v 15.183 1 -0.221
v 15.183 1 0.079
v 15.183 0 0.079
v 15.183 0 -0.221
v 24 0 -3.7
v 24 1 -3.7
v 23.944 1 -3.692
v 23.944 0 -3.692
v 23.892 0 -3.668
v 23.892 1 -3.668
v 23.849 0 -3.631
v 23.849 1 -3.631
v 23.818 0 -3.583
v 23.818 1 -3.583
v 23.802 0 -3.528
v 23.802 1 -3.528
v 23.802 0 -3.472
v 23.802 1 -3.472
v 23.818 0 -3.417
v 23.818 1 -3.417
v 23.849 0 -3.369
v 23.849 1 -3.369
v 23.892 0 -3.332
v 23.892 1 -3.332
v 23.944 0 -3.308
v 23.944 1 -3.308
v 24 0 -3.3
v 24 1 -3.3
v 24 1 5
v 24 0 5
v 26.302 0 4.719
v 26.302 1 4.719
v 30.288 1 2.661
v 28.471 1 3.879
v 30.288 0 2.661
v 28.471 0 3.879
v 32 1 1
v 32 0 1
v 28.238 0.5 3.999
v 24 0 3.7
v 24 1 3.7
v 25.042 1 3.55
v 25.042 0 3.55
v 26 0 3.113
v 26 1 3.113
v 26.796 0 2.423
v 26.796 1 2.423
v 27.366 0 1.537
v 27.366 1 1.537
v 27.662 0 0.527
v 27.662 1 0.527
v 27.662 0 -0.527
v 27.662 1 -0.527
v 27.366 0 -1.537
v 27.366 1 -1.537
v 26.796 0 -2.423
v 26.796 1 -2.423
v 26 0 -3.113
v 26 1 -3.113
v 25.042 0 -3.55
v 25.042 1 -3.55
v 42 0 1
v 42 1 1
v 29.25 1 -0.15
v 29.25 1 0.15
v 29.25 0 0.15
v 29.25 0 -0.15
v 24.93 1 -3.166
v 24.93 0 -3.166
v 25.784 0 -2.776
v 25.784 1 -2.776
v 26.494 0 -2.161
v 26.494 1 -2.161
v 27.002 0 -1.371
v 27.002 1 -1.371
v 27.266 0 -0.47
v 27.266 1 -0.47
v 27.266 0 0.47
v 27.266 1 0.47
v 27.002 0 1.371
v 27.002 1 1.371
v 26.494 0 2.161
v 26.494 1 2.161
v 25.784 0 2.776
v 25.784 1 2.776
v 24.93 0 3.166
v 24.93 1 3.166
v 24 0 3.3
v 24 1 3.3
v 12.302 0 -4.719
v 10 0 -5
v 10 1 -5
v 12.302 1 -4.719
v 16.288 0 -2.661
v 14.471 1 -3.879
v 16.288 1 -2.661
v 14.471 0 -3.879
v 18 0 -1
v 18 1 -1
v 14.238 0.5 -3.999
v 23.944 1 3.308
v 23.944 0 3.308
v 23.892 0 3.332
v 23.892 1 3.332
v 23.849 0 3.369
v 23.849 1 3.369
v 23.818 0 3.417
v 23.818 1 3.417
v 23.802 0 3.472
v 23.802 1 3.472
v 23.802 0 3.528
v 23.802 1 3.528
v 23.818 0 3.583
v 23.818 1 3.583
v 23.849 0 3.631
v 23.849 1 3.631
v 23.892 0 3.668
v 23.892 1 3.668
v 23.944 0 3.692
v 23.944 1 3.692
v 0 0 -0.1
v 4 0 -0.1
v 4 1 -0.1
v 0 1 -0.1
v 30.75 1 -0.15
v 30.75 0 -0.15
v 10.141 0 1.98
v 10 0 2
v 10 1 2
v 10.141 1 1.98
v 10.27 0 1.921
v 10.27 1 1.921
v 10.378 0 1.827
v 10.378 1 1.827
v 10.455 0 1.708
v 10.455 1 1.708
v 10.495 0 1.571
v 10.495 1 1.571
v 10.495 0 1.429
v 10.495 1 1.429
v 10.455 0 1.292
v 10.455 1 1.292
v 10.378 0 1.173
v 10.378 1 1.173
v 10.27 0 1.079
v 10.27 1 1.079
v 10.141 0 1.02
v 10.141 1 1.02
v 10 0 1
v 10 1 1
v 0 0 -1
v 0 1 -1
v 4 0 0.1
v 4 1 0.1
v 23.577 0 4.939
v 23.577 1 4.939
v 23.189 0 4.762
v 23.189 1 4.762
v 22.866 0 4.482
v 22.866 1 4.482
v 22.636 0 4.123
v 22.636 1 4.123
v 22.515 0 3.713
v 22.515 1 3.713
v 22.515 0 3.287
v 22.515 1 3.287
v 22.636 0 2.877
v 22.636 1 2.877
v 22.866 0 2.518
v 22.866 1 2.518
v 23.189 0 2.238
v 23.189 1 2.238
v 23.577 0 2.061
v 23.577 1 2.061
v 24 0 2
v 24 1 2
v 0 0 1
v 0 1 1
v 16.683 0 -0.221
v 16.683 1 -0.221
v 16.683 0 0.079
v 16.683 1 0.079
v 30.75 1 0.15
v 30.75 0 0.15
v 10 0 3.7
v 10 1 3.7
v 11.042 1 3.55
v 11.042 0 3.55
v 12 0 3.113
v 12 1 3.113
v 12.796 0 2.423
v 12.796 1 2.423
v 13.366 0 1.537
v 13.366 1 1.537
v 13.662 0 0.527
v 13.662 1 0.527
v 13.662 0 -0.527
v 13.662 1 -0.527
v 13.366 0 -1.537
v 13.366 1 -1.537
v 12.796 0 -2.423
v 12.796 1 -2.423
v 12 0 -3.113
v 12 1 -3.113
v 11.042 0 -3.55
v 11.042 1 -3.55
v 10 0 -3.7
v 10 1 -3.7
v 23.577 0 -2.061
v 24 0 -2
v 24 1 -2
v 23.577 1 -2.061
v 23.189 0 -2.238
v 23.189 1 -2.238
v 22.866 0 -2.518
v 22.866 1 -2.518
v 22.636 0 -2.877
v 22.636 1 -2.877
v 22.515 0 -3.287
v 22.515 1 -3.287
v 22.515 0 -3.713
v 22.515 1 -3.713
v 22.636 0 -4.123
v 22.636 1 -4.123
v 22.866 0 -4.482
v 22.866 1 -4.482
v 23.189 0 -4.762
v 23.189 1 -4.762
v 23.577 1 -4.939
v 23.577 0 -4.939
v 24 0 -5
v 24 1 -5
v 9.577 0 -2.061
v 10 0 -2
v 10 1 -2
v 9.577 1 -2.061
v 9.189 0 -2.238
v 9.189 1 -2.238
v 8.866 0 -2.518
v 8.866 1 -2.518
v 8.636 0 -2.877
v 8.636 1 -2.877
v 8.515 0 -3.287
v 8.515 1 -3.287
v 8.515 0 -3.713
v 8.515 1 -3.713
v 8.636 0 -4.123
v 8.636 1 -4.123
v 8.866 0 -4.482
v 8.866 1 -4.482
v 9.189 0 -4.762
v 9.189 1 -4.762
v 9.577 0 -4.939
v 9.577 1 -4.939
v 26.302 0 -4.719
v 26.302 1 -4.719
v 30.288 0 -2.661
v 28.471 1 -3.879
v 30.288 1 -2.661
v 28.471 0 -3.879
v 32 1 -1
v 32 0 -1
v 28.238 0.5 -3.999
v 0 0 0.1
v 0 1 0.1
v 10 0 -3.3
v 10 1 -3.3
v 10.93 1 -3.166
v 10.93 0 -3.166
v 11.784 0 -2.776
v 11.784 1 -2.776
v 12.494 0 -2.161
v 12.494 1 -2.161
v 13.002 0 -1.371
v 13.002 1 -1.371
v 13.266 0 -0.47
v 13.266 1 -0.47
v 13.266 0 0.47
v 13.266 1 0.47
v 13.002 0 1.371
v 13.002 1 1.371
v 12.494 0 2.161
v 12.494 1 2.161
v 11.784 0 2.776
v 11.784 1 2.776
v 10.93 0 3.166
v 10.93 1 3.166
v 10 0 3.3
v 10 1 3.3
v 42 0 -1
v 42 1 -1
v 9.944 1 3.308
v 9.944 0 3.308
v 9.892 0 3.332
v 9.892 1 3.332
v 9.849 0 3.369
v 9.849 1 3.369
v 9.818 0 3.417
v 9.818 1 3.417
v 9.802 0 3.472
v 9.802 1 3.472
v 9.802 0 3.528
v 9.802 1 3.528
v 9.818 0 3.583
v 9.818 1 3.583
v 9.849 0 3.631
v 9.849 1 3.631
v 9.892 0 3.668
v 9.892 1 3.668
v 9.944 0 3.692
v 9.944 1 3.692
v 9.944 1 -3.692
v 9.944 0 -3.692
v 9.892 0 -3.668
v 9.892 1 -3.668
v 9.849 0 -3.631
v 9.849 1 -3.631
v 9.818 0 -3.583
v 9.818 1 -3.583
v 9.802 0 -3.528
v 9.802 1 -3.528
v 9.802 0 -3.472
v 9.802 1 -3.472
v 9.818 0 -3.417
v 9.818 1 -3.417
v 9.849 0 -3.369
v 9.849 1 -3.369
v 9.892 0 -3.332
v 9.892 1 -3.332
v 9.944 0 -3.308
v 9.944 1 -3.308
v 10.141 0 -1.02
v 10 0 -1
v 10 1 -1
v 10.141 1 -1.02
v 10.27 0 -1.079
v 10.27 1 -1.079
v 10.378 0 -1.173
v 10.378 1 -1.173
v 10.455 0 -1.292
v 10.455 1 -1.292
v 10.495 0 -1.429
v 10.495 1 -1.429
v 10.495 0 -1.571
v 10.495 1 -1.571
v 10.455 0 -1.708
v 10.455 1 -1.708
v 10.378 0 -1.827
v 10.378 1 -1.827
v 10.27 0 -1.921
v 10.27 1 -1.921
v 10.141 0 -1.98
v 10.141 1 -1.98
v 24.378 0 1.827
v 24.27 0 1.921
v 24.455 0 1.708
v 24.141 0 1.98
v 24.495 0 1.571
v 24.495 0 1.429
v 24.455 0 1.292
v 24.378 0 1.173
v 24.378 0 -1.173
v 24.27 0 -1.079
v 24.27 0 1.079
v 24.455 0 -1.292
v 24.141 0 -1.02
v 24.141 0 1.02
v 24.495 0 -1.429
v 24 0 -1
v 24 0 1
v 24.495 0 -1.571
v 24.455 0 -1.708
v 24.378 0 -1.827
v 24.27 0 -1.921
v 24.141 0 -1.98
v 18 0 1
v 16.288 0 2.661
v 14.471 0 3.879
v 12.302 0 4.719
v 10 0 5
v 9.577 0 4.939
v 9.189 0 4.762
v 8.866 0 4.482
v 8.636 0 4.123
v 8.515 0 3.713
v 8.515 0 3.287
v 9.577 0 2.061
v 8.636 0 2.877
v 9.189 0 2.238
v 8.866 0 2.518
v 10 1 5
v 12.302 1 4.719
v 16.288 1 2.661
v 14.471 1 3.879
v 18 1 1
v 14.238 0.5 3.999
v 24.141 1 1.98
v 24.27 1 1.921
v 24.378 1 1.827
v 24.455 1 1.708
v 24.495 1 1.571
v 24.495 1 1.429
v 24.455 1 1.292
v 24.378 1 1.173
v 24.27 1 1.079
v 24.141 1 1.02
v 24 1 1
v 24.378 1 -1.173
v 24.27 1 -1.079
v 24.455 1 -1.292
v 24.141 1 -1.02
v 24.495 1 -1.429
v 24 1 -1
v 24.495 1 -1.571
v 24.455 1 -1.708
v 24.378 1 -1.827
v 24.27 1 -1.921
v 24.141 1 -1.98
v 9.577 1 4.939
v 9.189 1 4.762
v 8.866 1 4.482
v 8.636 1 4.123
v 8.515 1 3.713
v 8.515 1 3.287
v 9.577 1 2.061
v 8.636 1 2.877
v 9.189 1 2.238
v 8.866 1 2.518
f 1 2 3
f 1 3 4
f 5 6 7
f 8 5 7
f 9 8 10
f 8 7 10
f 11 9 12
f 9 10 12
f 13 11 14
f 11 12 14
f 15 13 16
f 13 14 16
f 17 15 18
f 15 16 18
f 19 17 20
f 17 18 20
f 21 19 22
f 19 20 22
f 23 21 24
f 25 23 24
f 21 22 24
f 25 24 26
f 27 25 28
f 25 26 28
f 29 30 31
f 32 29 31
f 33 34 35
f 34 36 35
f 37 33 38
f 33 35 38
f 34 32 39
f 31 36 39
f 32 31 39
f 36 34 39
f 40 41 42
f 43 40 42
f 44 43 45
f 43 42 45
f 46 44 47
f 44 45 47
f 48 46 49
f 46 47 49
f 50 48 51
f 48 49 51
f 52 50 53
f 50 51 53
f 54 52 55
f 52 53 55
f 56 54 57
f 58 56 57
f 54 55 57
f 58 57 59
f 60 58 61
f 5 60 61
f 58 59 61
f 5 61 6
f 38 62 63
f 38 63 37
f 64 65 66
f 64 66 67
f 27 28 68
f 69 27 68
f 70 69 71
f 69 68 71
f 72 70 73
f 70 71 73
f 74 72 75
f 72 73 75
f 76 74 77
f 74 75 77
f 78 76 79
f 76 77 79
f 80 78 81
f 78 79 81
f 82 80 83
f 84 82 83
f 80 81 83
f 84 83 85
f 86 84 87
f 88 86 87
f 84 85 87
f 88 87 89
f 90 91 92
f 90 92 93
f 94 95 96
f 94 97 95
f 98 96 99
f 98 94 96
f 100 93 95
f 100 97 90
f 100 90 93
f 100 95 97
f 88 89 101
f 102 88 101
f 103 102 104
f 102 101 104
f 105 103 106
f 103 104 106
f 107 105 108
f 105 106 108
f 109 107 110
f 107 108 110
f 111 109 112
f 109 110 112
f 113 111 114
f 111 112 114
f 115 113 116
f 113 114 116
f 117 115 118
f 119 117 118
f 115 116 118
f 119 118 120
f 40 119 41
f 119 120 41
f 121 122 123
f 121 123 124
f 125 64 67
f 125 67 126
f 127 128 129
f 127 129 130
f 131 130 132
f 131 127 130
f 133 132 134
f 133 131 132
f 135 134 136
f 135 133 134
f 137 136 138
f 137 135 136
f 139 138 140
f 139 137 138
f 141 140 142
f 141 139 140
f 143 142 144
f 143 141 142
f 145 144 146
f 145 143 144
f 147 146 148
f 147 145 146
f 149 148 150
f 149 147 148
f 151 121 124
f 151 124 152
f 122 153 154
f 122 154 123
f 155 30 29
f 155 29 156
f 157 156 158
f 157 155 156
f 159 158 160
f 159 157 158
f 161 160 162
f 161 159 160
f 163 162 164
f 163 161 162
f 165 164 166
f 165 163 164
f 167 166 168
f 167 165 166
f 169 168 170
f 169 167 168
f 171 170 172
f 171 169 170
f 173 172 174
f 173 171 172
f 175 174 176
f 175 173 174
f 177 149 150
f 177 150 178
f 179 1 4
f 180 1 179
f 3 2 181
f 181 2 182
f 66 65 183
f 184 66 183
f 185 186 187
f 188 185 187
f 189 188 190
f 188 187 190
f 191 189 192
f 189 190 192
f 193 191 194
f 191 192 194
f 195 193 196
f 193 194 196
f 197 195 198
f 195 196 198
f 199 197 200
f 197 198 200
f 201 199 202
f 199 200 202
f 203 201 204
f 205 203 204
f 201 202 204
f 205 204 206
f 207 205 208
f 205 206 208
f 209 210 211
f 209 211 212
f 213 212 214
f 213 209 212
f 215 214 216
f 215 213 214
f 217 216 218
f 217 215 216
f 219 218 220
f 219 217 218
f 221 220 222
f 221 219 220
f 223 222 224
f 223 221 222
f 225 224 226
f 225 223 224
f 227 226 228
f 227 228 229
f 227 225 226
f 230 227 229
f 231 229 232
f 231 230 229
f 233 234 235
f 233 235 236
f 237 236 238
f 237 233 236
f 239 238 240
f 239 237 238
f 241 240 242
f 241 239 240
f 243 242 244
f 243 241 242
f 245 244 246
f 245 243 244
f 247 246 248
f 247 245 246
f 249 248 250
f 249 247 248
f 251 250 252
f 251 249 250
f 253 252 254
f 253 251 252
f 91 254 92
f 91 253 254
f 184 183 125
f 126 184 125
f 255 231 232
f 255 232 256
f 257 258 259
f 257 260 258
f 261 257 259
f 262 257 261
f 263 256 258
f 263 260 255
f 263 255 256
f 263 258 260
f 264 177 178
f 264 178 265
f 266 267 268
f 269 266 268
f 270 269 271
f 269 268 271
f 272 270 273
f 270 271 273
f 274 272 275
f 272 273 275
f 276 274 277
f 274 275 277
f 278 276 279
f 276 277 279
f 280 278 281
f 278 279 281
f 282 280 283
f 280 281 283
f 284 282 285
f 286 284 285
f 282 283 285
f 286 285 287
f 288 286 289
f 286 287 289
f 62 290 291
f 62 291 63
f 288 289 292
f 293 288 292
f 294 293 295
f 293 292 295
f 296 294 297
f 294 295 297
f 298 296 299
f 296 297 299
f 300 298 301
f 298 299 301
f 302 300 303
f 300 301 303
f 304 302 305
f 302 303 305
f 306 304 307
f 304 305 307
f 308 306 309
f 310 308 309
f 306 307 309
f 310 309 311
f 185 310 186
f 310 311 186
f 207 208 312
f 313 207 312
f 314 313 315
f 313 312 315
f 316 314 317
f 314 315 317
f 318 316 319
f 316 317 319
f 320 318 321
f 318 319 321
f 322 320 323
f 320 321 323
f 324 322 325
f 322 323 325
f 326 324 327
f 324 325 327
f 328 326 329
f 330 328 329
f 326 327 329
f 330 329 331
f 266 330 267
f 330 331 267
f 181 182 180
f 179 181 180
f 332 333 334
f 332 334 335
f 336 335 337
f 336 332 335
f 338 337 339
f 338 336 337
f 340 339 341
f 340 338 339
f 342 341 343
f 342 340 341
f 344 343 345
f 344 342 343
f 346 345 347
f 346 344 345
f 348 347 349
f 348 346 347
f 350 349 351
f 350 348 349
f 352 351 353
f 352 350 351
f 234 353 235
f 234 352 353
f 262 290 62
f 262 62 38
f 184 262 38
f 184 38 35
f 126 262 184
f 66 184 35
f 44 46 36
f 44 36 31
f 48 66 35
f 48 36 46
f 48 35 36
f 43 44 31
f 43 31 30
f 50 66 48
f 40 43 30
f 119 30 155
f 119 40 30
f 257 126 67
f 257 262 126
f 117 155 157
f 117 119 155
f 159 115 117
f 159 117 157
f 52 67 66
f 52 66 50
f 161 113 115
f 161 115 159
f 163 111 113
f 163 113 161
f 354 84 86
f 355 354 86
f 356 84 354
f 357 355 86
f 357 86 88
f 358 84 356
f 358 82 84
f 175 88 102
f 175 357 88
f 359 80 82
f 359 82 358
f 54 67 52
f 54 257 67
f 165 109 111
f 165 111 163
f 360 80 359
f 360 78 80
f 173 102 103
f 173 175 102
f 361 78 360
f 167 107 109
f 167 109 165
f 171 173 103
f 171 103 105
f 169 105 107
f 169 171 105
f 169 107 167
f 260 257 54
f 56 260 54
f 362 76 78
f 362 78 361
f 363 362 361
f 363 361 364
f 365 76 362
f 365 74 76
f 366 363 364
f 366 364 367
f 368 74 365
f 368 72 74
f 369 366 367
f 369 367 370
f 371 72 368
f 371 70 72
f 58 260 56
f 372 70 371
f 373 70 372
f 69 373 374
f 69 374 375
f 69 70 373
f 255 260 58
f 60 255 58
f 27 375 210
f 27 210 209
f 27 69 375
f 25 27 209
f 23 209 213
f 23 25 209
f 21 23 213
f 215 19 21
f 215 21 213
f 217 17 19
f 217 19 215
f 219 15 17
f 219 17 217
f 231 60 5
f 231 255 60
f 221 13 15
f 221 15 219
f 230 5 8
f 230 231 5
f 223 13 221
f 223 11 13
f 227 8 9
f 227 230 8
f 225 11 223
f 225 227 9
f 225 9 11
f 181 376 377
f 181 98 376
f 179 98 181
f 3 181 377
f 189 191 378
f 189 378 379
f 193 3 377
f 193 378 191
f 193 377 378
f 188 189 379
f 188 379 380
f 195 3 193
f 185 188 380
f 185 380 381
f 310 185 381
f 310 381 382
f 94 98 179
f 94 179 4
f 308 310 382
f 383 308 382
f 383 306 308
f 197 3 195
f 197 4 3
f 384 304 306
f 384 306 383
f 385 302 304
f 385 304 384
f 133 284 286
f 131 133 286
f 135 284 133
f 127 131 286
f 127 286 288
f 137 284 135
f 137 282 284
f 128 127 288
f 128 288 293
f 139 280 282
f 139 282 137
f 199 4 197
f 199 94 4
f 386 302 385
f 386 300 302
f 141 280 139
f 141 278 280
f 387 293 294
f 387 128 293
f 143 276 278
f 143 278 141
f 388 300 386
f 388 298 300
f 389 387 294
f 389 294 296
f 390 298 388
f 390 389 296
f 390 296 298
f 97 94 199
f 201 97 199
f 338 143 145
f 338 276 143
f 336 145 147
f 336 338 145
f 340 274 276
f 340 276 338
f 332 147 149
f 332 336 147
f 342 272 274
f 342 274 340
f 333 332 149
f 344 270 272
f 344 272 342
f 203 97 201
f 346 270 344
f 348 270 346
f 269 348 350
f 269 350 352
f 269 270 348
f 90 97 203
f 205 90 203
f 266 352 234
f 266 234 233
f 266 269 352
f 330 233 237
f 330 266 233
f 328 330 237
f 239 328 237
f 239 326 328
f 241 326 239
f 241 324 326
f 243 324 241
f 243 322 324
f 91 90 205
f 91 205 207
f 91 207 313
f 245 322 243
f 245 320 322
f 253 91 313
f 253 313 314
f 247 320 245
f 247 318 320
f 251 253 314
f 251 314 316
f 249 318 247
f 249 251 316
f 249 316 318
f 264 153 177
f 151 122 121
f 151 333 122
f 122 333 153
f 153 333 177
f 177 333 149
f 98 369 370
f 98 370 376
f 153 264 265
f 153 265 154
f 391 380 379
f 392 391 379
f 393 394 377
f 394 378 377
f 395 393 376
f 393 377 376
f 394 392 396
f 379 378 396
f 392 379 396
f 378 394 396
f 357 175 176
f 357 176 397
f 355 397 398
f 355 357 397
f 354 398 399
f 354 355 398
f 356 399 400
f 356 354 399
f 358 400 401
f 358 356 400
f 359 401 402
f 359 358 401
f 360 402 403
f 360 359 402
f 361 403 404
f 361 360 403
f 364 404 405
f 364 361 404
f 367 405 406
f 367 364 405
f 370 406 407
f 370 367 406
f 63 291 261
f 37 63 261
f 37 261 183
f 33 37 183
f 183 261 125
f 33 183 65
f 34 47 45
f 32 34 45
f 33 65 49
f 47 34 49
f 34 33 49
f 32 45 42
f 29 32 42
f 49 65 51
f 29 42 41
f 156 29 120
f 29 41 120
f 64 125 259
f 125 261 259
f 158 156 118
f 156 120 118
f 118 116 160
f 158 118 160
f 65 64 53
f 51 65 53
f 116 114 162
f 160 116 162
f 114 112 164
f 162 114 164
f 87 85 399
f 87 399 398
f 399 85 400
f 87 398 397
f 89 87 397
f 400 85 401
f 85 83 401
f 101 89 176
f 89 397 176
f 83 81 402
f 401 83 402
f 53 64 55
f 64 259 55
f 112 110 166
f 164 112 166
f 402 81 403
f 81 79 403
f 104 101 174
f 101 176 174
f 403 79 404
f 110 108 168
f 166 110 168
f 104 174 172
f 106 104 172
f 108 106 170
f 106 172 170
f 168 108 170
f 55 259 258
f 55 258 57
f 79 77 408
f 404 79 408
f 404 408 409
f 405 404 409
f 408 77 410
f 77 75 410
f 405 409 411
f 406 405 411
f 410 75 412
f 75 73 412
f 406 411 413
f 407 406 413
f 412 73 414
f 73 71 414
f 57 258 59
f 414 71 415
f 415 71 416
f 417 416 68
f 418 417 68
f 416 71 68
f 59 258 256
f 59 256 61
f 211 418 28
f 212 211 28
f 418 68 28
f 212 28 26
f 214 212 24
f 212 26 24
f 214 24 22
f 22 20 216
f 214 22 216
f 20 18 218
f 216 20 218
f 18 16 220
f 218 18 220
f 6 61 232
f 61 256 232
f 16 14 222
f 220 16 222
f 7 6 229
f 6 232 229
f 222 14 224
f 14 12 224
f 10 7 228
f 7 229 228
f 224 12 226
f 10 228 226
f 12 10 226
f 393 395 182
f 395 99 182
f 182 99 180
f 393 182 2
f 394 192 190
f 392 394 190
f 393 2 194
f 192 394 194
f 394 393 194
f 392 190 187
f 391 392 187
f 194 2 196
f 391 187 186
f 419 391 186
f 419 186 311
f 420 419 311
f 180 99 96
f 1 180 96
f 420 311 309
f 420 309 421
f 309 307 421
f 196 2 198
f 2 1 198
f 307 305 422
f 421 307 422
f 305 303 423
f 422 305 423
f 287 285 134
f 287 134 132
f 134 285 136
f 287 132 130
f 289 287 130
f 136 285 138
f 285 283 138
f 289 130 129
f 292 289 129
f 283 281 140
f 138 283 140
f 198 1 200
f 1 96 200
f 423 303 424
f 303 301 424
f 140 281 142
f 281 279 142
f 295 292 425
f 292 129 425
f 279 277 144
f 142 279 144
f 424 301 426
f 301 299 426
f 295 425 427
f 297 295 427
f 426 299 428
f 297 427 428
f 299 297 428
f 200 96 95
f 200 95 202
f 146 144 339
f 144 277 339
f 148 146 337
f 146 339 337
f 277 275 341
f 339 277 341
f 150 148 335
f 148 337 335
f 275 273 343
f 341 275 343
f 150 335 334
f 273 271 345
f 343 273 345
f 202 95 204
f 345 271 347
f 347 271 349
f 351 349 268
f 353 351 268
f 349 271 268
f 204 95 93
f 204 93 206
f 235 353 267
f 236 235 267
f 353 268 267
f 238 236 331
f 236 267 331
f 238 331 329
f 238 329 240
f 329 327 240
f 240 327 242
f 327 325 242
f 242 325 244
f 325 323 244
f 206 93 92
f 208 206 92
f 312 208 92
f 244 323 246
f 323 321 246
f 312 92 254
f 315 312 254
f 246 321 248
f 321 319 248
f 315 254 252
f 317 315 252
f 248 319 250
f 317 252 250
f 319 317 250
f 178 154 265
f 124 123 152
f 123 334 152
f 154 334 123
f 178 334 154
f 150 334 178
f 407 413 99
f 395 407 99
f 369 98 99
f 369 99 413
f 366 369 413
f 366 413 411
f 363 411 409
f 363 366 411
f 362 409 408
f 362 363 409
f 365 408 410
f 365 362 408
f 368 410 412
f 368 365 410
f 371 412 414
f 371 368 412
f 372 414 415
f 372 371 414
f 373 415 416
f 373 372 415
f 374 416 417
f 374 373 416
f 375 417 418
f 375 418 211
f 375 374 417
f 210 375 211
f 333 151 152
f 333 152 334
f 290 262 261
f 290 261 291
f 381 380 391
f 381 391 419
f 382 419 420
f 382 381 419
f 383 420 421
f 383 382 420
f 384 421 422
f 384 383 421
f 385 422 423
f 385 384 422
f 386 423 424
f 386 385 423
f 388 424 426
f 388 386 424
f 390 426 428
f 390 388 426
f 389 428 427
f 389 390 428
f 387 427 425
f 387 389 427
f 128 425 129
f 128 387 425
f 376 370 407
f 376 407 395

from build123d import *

# Parameters (mm, degrees)
BOSS_EXTRUDE1_DEPTH = 1
SKETCH2_W           = 1.5
SKETCH2_H           = 0.3
CUT_EXTRUDE1_DEPTH  = 1


with BuildPart() as part:
    # Sketch1 → Boss-Extrude1 (new body)
    with BuildSketch(Plane(origin=(0, 0, 0), x_dir=(1, 0, 0), z_dir=(0, 1, 0))):
        with BuildLine():
            Line((0, 1), (10, 1))
            ThreePointArc((10, 1), (10.499999999, 1.499999999), (10, 1.999999998))
            ThreePointArc((10, 1.999999998), (8.5, 3.499999998), (10, 4.999999998))
            add(Edge.make_bspline(
                [(10, 4.999999998), (14.475567746, 4.998166583), (17.999999995, 1)],
                knots=[0, 0, 0, 1, 1, 1], degree=2))
            Line((17.999999995, 1), (24, 1))
            ThreePointArc((24, 1), (24.499999999, 1.5), (24, 1.999999999))
            ThreePointArc((24, 1.999999999), (22.500000001, 3.500000002), (24.000000003, 5))
            add(Edge.make_bspline(
                [(24.000000003, 5), (28.47556775, 4.998166585), (31.999999998, 1)],
                knots=[0, 0, 0, 1, 1, 1], degree=2))
            Line((31.999999998, 1), (41.999999998, 1))
            Line((41.999999998, 1), (41.999999998, -1.000000004))
            Line((41.999999998, -1.000000004), (31.999999996, -1.000000004))
            add(Edge.make_bspline(
                [(23.999999999, -5), (28.475567744, -4.998166004), (31.999999996, -1.000000004)],
                knots=[0, 0, 0, 1, 1, 1], degree=2))
            ThreePointArc((23.999999999, -5), (22.499999999, -3.5), (23.999999999, -2))
            ThreePointArc((23.999999999, -2), (24.499999999, -1.5), (23.999999999, -1))
            Line((23.999999999, -1), (17.999999995, -1))
            add(Edge.make_bspline(
                [(10, -4.999999998), (14.475567746, -4.998166584), (17.999999995, -1)],
                knots=[0, 0, 0, 1, 1, 1], degree=2))
            ThreePointArc((10, -4.999999998), (8.50000001, -3.500000008), (10, -2.000000018))
            ThreePointArc((10, -2.000000018), (10.500000009, -1.500000009), (10, -1))
            Line((10, -1), (0, -1))
            Line((0, -1), (0, -0.1))
            Line((0, -0.1), (4, -0.1))
            Line((4, -0.1), (4, 0.1))
            Line((4, 0.1), (0, 0.1))
            Line((0, 0.1), (0, 1))
        make_face()
    extrude(amount=BOSS_EXTRUDE1_DEPTH)

    # Sketch2 → Cut-Extrude1 (cut)
    with BuildSketch(Plane(origin=(0, 1, 0), x_dir=(1, 0, 0), z_dir=(0, 1, 0))):
        with Locations((15.932882113, 0.071093436)):
            Rectangle(SKETCH2_W, SKETCH2_H)
        with Locations((30.000000004, 3e-09)):
            Rectangle(SKETCH2_W, SKETCH2_H)
        with BuildLine():
            ThreePointArc((10, -3.699999998), (13.699999998, 0), (10, 3.699999998))
            ThreePointArc((10, 3.699999998), (9.800000001, 3.499999999), (10, 3.3))
            ThreePointArc((10, 3.3), (13.3, 0), (10, -3.3))
            ThreePointArc((10, -3.3), (9.800000001, -3.499999999), (10, -3.699999998))
        make_face()
        with BuildLine():
            ThreePointArc((24, -3.699999998), (27.699999998, 0), (24, 3.699999998))
            ThreePointArc((24, 3.699999998), (23.8, 3.499999998), (24, 3.299999998))
            ThreePointArc((24, 3.299999998), (27.299999998, 0), (24, -3.299999998))
            ThreePointArc((24, -3.299999998), (23.8, -3.499999998), (24, -3.699999998))
        make_face()
    extrude(amount=-CUT_EXTRUDE1_DEPTH, mode=Mode.SUBTRACT)


solid = part.part
